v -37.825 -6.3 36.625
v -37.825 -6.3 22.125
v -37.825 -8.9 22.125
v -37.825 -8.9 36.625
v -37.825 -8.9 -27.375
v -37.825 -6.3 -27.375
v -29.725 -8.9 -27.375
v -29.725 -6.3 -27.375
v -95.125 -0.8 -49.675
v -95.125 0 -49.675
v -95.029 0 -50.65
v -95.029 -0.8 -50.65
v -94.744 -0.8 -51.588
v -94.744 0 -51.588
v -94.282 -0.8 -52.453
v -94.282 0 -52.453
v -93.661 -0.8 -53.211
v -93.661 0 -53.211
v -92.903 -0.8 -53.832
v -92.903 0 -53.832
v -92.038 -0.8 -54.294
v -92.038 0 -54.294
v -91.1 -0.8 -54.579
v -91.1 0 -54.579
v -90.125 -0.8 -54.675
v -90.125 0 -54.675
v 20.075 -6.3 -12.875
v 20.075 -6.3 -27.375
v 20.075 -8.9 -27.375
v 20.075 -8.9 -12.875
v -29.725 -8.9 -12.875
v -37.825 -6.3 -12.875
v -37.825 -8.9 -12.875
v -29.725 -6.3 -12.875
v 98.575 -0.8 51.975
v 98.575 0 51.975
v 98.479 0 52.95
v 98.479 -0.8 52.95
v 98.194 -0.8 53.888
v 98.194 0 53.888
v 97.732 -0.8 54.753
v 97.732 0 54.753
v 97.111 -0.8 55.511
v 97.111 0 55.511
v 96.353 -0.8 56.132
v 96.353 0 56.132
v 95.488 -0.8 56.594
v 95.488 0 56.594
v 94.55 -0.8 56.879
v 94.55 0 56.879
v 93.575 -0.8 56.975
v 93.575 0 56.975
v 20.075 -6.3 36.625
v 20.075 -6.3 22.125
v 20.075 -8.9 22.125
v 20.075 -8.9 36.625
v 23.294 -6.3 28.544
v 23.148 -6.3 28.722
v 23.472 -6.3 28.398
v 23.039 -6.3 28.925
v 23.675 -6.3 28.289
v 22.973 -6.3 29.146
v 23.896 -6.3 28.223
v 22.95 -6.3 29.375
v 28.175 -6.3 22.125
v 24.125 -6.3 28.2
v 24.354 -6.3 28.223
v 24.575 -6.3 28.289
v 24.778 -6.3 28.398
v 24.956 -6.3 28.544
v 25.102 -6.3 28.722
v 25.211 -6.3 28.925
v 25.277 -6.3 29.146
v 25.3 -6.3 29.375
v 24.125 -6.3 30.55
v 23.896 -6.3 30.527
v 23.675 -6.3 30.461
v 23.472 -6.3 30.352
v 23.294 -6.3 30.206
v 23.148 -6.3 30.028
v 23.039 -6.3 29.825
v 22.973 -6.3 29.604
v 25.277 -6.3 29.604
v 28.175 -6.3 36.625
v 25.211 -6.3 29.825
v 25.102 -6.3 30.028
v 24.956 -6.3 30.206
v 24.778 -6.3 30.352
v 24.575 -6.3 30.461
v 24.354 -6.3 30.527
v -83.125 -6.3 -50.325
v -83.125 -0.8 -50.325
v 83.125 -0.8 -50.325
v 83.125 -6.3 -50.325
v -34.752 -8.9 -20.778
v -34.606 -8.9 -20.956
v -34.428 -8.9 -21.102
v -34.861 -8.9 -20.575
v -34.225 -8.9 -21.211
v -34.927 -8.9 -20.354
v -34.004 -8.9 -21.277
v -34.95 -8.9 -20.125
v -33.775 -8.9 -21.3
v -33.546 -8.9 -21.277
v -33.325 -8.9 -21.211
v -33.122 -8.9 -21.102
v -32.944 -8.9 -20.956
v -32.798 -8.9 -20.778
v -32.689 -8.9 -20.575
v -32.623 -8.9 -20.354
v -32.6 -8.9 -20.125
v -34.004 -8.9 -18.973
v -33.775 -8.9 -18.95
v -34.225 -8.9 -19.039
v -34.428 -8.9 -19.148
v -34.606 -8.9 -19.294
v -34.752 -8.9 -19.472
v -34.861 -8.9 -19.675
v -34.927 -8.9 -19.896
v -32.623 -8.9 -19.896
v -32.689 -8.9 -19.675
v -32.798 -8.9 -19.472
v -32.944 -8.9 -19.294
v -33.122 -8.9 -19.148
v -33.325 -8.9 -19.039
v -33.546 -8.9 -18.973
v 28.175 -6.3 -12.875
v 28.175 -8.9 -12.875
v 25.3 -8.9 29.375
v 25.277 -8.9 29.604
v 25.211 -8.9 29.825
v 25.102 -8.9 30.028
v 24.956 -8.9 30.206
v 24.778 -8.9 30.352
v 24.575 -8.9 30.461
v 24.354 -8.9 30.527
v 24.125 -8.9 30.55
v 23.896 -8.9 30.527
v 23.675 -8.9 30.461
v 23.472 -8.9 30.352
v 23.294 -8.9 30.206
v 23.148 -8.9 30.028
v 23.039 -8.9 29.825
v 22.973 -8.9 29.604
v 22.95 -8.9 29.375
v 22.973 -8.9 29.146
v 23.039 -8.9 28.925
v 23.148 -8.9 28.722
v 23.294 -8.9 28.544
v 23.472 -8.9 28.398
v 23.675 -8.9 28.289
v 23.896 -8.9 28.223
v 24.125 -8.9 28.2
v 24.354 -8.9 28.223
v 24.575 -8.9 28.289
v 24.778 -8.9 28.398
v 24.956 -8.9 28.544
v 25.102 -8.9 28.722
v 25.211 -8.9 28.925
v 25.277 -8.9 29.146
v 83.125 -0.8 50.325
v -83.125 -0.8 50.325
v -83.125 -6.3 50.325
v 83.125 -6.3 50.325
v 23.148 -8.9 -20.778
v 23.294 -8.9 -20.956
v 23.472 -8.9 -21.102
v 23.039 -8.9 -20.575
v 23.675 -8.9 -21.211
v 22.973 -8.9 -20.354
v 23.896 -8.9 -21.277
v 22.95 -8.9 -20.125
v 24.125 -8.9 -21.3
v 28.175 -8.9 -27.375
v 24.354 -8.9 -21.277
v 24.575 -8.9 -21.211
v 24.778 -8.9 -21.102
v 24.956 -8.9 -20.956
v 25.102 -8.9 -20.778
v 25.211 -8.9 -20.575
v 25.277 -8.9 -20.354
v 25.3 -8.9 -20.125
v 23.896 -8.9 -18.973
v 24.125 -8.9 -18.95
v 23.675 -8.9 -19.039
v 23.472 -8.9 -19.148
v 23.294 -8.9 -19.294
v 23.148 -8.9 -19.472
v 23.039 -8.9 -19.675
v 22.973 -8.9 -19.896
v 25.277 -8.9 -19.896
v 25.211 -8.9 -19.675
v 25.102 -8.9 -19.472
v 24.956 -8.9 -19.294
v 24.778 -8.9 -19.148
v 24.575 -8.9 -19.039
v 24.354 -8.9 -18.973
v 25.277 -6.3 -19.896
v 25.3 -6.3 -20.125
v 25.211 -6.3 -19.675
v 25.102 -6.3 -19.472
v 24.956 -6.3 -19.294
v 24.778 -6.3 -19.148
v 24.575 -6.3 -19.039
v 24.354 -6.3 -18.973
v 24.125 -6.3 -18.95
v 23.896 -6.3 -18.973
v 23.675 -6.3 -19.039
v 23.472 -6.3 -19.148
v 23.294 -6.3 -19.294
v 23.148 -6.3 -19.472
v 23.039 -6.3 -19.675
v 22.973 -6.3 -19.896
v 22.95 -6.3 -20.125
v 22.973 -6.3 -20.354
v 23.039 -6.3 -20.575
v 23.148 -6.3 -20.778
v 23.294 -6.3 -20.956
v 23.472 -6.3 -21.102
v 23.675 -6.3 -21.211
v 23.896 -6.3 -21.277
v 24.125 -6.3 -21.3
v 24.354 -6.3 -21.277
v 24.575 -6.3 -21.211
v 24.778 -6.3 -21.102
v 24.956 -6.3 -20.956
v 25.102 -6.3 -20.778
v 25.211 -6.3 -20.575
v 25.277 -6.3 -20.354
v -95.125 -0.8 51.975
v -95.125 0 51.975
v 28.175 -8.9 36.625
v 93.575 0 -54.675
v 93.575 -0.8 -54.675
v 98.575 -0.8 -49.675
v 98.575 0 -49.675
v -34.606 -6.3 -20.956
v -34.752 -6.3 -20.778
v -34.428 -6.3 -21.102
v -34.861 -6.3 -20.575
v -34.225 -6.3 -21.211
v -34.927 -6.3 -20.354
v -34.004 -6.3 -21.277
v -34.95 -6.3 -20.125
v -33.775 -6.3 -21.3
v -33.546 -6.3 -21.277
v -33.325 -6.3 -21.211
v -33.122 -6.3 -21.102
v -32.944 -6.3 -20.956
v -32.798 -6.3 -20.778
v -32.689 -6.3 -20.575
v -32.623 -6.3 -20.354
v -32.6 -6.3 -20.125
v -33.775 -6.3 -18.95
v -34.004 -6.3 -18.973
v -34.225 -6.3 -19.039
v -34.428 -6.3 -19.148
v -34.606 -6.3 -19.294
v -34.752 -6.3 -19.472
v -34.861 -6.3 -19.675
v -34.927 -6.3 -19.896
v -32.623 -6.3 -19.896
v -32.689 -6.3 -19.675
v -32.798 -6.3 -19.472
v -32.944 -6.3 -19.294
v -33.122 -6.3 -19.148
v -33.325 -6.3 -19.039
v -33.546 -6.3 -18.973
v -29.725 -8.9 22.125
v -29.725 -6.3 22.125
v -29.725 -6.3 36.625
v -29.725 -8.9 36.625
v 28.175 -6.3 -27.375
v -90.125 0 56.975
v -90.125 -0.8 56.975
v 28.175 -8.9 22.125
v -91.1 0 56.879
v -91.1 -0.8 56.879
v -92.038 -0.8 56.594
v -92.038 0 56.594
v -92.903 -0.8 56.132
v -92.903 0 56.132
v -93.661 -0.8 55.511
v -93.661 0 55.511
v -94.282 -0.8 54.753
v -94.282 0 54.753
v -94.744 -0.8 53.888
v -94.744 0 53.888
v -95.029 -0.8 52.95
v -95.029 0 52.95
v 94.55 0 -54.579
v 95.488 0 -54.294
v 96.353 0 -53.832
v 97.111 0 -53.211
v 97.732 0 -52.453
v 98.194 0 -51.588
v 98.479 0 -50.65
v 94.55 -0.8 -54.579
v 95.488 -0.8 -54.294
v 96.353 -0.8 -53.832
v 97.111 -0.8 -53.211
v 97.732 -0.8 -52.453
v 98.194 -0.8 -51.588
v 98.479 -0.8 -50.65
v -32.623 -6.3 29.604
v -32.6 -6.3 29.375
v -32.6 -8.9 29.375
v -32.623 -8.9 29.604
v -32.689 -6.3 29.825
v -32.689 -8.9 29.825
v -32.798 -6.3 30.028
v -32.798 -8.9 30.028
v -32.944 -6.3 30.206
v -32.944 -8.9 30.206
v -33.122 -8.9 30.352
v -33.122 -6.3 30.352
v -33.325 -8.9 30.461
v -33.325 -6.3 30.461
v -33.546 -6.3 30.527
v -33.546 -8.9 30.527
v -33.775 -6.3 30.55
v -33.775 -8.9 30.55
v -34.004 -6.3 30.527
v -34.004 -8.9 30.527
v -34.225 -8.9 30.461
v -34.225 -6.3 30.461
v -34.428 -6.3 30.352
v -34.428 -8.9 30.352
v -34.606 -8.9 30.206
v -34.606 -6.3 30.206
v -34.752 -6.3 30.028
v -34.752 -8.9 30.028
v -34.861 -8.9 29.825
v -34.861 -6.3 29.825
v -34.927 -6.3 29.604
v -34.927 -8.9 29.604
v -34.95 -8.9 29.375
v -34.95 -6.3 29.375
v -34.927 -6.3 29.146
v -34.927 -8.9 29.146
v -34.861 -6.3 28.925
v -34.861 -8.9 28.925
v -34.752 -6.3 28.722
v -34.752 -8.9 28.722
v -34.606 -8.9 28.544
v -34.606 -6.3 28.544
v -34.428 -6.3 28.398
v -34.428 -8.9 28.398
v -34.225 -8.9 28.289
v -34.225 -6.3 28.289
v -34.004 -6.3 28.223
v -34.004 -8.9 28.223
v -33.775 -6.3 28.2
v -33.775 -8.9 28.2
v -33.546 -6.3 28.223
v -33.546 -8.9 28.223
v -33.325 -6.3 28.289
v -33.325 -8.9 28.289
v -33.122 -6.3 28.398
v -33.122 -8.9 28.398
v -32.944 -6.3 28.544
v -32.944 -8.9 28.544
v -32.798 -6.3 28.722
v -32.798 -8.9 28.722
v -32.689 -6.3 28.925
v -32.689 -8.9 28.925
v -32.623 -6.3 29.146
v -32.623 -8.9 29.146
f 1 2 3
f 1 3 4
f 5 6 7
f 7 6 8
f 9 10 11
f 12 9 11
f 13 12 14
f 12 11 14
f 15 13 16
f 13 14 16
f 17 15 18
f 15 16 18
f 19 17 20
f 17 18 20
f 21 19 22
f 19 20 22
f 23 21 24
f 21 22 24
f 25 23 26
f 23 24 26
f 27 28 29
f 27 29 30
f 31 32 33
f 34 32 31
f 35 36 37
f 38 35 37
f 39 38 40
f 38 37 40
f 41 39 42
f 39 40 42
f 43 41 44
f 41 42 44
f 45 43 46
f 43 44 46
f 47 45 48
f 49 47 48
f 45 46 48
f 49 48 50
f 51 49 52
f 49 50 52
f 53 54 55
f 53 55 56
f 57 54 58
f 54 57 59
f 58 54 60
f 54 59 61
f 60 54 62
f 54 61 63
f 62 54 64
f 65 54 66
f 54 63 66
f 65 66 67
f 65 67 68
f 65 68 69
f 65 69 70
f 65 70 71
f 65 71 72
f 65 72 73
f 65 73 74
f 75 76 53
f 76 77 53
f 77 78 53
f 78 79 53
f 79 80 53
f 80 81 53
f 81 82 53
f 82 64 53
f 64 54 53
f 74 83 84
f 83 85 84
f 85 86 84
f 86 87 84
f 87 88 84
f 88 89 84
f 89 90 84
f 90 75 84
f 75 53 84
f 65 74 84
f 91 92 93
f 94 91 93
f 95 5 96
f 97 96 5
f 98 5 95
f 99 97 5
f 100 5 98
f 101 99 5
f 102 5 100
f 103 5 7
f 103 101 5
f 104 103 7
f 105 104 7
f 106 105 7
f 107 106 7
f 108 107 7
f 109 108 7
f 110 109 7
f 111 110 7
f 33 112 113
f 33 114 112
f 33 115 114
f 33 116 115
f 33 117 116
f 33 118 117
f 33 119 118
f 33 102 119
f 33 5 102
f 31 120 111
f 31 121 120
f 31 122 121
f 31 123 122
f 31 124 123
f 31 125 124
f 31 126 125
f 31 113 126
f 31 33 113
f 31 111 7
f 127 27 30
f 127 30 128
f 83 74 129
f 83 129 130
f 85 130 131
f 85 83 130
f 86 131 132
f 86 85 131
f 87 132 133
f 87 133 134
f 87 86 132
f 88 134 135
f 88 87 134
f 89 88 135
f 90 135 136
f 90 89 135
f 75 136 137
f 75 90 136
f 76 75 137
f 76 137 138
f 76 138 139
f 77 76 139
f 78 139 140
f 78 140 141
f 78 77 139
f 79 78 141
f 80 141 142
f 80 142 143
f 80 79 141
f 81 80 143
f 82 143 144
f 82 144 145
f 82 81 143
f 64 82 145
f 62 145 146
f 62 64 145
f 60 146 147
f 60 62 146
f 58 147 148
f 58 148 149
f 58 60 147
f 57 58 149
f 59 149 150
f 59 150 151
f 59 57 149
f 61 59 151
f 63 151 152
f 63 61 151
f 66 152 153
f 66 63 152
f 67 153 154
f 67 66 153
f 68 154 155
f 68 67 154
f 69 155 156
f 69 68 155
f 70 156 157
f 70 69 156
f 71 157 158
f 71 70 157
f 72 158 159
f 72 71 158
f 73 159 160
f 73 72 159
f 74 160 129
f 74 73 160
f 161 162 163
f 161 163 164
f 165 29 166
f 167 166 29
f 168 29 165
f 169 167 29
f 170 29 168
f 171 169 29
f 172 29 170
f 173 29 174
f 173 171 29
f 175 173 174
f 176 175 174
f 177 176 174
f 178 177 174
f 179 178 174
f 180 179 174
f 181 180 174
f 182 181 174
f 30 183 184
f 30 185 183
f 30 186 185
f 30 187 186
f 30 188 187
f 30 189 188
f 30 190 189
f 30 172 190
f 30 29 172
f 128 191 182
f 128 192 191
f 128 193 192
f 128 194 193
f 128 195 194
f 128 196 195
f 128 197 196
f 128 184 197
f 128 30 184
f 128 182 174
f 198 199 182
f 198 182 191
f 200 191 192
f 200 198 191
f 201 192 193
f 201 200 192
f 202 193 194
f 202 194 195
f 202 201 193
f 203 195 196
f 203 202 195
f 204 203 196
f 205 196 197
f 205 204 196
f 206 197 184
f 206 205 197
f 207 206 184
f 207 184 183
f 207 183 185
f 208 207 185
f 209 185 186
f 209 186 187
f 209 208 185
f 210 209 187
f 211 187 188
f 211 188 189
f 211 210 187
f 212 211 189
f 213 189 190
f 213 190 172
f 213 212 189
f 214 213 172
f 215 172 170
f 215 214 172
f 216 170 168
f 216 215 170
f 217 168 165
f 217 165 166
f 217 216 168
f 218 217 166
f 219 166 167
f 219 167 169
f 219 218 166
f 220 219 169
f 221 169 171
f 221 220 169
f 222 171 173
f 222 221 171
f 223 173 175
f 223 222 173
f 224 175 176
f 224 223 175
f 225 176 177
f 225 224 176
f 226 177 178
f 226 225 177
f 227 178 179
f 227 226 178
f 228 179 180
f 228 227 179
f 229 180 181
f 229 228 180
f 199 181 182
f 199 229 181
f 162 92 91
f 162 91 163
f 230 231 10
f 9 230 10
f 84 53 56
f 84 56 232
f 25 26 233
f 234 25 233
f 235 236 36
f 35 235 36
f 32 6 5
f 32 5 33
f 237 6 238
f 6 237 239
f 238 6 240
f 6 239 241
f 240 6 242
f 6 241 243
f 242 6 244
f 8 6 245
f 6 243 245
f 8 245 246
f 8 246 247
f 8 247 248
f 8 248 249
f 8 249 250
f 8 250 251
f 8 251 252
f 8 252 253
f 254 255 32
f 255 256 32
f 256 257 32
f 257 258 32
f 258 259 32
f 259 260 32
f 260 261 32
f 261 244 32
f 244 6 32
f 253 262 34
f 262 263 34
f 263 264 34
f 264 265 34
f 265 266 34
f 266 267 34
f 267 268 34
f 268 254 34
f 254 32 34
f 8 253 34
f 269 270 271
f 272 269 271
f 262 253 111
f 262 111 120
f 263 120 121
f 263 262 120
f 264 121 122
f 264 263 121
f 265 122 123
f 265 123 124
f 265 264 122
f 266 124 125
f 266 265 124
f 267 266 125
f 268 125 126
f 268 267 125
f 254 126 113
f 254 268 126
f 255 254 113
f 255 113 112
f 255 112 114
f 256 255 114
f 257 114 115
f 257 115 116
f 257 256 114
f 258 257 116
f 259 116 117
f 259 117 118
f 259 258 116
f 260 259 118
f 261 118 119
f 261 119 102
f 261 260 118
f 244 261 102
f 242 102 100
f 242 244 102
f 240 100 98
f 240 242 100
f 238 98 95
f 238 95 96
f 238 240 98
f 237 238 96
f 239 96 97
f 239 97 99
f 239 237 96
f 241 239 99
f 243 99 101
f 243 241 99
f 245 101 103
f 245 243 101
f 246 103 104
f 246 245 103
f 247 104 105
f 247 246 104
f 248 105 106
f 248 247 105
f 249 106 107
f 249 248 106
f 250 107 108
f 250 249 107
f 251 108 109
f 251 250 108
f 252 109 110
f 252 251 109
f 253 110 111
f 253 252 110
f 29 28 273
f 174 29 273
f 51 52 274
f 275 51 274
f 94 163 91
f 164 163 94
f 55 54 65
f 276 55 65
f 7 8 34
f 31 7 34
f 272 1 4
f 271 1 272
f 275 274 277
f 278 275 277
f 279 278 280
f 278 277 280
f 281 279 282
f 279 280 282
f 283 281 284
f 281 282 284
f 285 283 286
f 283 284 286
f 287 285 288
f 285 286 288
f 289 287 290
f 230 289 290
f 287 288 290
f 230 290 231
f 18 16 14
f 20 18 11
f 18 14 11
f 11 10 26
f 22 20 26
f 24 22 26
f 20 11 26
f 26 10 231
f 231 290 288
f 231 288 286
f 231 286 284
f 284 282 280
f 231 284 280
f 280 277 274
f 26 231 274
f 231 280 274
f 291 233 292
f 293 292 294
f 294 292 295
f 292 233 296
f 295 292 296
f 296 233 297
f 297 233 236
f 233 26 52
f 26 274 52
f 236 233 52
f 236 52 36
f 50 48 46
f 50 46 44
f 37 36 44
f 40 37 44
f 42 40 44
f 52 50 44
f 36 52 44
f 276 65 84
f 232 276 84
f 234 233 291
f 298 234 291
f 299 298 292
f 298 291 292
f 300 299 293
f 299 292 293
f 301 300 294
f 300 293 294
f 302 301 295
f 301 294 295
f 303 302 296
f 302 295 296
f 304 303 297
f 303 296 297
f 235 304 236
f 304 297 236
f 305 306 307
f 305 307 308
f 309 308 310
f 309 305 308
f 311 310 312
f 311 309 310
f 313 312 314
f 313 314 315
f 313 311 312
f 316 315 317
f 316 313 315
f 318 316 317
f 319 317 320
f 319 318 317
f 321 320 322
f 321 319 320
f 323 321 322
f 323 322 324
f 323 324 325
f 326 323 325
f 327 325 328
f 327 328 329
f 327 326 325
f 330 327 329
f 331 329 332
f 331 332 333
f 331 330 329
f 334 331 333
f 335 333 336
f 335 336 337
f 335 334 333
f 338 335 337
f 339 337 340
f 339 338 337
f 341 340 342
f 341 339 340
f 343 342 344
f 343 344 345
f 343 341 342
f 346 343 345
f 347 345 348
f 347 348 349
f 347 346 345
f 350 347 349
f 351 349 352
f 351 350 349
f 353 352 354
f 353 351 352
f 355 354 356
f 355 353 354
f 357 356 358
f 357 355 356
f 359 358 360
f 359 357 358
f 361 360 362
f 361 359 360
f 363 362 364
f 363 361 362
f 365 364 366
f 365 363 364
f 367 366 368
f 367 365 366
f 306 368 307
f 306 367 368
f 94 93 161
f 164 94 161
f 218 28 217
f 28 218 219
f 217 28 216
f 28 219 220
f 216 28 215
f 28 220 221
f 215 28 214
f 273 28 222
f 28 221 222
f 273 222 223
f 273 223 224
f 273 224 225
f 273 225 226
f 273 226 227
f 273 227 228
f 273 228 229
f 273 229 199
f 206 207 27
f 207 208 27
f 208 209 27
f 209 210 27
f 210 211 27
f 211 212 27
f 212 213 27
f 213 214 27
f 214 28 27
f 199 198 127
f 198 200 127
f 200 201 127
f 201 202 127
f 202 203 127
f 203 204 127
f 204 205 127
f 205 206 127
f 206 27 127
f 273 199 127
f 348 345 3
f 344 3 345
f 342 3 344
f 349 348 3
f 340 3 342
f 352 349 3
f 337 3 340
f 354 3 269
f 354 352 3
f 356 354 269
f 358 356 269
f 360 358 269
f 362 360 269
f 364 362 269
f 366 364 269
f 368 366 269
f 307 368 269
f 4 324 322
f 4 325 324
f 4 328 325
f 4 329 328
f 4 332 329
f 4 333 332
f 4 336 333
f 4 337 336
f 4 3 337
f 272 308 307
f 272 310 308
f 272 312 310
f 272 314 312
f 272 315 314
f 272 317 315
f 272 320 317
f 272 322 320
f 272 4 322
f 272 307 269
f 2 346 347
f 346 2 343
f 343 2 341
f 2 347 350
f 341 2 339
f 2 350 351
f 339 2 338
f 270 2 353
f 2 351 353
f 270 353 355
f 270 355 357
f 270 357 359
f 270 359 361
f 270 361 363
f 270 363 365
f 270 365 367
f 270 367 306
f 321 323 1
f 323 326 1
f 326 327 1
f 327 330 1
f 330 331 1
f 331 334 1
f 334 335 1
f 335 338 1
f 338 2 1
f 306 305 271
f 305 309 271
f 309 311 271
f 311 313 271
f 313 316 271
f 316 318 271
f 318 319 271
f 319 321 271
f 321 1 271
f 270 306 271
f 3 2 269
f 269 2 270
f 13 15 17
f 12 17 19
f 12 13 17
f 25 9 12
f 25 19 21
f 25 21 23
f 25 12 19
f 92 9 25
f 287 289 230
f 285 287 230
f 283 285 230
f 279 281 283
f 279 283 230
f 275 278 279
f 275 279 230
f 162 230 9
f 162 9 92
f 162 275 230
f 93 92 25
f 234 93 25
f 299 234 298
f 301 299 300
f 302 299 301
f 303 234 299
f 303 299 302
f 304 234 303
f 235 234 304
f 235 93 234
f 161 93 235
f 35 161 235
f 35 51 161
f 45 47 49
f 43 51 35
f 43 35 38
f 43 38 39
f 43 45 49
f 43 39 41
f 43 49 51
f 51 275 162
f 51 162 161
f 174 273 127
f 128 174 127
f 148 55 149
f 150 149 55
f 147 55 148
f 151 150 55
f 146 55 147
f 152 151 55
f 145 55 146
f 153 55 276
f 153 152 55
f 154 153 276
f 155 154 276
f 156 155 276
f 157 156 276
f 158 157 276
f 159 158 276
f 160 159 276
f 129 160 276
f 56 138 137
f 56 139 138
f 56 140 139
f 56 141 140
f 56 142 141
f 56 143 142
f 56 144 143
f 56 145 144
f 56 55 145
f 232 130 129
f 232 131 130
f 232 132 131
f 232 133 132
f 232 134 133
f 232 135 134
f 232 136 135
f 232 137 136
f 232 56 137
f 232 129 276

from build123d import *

# Parameters (mm, degrees)
F1_DEPTH = 0.8
F2_W     = 166.25
F2_H     = 100.65
F3_DEPTH = 5.5
F4_W     = 8.1
F4_H     = 14.5
F4_R     = 1.175
F5_DEPTH = 2.6


with BuildPart() as f1:
    # F0 (on Front) → F1 (new body)
    with BuildSketch(Plane.XZ):
        with BuildLine():
            Line((-95.125, 51.975), (-95.125, 0))
            Line((-95.125, 0), (-95.125, -49.675))
            ThreePointArc((-95.125, -49.675), (-93.660534, -53.210534), (-90.125, -54.675))
            Line((-90.125, -54.675), (93.575, -54.675))
            ThreePointArc((93.575, -54.675), (97.110534, -53.210534), (98.575, -49.675))
            Line((98.575, -49.675), (98.575, 0))
            Line((98.575, 0), (98.575, 51.975))
            ThreePointArc((98.575, 51.975), (97.110534, 55.510534), (93.575, 56.975))
            Line((93.575, 56.975), (-90.125, 56.975))
            ThreePointArc((-90.125, 56.975), (-93.660534, 55.510534), (-95.125, 51.975))
        make_face()
    extrude(amount=F1_DEPTH)

    # F2 (on face) → F3 (join)
    with BuildSketch(Plane.XZ.offset(0.8)):
        Rectangle(F2_W, F2_H)
    extrude(amount=F3_DEPTH)


with BuildPart() as f5:
    # F4 (on face) → F5 (new body)
    with BuildSketch(Plane.XZ.offset(6.3)):
        with Locations((-33.775, 29.375)):
            Rectangle(F4_W, F4_H)
        with Locations((-33.775, 29.375)):
            Circle(F4_R, mode=Mode.SUBTRACT)
        with Locations((24.125, 29.375)):
            Rectangle(F4_W, F4_H)
        with Locations((24.125, 29.375)):
            Circle(F4_R, mode=Mode.SUBTRACT)
        with Locations((24.125, -20.125)):
            Rectangle(F4_W, F4_H)
        with Locations((24.125, -20.125)):
            Circle(F4_R, mode=Mode.SUBTRACT)
        with Locations((-33.775, -20.125)):
            Rectangle(F4_W, F4_H)
        with Locations((-33.775, -20.125)):
            Circle(F4_R, mode=Mode.SUBTRACT)
    extrude(amount=F5_DEPTH)


solid = Compound([f1.part, f5.part])
